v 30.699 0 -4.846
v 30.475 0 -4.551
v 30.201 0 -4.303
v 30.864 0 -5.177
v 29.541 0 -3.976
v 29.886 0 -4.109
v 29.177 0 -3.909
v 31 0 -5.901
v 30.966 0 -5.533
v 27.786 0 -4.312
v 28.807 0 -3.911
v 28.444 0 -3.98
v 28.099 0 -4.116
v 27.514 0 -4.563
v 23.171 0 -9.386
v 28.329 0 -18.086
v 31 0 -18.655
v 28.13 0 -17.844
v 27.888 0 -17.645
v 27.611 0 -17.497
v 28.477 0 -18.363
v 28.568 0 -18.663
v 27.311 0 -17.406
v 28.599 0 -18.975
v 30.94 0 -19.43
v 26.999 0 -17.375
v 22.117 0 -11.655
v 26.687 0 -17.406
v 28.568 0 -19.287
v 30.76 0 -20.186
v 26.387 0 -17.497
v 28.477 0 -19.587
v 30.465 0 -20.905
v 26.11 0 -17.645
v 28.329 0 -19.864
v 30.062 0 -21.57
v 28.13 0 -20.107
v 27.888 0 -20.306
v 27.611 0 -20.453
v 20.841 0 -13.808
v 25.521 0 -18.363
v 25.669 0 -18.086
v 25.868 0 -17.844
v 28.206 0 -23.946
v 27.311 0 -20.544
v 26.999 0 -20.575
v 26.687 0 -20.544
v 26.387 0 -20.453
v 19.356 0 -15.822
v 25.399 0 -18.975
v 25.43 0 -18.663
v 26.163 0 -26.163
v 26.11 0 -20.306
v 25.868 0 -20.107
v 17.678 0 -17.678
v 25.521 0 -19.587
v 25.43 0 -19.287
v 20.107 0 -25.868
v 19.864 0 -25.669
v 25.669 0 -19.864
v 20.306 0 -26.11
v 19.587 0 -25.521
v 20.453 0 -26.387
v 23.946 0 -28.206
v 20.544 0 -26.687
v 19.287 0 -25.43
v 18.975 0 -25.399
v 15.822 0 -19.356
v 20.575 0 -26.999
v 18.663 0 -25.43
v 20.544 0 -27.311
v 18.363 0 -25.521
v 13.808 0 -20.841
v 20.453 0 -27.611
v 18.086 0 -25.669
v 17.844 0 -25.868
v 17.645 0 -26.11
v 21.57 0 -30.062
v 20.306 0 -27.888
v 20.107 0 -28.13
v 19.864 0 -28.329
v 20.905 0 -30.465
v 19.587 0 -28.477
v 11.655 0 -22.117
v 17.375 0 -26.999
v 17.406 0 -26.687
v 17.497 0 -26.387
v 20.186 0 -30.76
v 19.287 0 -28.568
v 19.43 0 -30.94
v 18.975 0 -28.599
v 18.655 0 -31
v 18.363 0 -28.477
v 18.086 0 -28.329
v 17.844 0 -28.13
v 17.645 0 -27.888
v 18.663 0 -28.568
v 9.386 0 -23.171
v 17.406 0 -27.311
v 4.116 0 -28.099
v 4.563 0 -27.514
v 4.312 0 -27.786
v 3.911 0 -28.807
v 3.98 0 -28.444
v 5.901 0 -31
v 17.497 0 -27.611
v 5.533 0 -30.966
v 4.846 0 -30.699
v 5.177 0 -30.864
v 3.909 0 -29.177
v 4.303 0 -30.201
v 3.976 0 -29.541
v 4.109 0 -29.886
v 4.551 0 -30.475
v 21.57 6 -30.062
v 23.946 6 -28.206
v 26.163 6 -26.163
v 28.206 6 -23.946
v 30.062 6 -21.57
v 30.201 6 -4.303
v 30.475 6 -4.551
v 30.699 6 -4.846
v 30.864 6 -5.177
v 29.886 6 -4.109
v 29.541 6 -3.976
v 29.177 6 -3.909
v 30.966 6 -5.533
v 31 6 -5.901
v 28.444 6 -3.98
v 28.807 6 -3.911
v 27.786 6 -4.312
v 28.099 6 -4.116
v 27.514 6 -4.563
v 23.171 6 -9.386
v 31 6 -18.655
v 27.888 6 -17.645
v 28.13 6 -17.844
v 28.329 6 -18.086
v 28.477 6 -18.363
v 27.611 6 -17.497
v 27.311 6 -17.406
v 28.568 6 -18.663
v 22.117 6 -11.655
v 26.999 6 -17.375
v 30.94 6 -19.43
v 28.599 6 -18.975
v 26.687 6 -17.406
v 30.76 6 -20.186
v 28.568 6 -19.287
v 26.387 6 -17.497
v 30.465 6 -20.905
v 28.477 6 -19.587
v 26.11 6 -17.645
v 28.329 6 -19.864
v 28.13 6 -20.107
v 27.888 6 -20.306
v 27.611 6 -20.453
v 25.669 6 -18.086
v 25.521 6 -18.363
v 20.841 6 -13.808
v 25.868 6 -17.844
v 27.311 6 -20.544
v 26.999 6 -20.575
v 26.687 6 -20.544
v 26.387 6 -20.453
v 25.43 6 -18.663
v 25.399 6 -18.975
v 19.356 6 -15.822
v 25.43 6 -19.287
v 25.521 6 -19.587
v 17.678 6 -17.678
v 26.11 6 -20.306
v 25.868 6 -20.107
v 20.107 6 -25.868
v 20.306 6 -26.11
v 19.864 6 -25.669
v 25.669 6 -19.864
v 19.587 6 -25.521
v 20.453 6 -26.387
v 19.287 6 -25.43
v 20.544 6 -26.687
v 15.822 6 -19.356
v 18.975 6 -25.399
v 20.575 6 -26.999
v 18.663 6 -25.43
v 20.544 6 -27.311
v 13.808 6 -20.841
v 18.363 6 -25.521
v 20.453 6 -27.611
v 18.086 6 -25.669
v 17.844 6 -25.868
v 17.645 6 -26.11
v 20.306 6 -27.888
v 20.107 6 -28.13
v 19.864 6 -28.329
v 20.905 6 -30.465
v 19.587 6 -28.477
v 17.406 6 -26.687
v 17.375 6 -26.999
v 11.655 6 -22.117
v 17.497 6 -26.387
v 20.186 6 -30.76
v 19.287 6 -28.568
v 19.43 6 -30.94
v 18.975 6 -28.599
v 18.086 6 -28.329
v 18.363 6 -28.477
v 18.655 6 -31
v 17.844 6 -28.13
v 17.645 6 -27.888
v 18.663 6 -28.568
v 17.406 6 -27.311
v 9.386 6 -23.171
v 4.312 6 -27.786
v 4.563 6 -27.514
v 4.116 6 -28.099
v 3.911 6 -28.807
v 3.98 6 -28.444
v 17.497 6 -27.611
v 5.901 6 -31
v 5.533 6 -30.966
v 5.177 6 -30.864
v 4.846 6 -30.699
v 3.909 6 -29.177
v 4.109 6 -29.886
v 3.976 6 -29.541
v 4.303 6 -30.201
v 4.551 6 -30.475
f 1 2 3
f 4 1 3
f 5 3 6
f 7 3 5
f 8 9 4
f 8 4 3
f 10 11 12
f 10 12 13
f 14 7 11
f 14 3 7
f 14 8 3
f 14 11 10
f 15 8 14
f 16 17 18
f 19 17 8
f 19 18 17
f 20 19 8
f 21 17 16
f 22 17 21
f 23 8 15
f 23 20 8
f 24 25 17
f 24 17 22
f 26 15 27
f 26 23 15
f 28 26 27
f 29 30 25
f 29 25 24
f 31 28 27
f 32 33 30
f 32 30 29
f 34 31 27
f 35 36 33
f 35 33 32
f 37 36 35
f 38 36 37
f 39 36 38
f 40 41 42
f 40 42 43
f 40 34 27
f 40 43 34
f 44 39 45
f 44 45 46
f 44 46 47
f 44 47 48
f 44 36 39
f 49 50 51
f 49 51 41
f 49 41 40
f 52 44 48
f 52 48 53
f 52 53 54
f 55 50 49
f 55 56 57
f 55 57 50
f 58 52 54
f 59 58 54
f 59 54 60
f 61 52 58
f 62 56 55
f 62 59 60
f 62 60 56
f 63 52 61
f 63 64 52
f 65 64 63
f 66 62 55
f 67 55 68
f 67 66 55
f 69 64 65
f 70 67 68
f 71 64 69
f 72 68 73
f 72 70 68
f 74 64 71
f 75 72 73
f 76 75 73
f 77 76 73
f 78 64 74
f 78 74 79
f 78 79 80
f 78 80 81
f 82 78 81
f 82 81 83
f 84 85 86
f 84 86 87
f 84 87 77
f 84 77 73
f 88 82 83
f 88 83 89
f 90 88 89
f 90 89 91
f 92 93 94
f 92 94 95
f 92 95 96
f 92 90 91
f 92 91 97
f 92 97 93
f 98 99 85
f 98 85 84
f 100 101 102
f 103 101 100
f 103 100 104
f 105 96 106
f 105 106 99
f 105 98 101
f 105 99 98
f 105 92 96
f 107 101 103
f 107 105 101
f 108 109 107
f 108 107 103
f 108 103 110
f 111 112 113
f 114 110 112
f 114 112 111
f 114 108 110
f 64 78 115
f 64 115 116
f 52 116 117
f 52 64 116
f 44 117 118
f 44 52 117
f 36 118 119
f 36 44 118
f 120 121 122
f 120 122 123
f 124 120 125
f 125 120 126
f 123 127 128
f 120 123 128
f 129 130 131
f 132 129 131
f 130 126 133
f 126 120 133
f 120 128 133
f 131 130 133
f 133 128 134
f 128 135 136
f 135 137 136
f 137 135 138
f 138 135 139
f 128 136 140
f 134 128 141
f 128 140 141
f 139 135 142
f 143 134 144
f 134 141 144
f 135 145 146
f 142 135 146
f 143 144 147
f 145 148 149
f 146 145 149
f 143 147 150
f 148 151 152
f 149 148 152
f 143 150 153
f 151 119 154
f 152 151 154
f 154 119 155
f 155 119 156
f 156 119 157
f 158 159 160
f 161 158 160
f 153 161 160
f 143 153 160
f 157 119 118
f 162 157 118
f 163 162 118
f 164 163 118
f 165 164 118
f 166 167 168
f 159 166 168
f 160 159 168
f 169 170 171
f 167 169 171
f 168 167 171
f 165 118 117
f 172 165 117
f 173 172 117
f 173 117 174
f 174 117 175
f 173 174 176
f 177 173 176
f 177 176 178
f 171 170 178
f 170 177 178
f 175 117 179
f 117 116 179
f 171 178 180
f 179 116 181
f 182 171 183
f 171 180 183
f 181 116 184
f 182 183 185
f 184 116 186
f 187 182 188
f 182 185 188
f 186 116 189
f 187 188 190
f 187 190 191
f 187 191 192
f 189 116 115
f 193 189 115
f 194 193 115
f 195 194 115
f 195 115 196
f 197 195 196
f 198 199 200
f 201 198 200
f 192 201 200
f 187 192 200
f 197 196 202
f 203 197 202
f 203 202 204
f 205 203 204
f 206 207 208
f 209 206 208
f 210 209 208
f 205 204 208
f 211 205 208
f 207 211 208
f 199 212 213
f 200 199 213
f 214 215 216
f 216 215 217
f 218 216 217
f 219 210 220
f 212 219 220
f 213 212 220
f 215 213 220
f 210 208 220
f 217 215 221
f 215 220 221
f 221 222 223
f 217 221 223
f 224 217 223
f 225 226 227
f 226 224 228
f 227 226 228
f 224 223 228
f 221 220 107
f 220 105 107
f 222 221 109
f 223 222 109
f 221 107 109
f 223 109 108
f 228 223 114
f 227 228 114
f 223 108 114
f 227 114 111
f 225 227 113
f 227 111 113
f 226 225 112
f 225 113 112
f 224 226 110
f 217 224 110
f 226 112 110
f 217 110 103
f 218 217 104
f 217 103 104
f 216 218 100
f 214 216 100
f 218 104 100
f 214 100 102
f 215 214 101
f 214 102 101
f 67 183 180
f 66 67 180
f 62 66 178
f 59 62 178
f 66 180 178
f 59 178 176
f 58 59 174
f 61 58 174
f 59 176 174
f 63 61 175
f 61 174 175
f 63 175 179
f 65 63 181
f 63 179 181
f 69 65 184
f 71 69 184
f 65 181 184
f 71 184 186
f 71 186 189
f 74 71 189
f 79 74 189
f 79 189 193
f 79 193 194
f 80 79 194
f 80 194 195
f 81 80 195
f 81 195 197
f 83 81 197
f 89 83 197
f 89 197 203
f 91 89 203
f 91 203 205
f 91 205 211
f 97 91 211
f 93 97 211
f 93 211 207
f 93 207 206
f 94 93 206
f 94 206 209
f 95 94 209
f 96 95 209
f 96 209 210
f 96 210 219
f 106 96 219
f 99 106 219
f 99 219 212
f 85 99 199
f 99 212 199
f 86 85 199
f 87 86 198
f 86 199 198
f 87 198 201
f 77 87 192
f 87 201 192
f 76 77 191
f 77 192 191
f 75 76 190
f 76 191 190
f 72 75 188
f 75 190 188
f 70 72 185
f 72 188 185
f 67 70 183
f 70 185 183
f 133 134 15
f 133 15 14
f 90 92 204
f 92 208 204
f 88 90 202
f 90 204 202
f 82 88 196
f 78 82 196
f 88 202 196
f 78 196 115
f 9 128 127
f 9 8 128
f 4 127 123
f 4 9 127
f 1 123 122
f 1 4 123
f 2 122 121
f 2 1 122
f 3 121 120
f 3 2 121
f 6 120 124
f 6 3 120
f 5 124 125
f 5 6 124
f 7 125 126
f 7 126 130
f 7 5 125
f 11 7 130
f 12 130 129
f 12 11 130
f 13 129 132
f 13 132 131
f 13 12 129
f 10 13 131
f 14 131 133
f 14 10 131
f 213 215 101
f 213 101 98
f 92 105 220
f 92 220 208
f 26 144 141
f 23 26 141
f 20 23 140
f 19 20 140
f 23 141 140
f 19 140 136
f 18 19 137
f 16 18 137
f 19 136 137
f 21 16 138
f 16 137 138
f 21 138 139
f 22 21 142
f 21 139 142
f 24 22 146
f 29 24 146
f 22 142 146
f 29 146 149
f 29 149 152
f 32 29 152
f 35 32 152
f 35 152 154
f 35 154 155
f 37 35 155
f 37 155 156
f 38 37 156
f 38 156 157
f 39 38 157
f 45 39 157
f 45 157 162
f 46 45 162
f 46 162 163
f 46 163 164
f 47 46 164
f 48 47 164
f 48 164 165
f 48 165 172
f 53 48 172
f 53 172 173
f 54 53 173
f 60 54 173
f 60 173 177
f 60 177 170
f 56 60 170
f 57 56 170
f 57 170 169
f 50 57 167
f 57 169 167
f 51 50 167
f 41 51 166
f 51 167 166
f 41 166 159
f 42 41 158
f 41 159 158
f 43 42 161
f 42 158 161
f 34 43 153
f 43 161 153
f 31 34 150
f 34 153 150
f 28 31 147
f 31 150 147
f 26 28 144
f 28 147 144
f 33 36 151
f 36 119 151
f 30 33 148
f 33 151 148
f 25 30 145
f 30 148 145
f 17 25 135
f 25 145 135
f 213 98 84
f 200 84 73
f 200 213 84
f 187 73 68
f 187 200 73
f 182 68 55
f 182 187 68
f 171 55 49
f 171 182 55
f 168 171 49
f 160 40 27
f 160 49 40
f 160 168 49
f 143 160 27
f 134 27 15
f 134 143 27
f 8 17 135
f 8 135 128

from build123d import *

# Parameters (mm, degrees)
EXTRUDE_1_DEPTH     = 6
SKETCH_2_R          = 1.6
CUT_EXTRUDE_1_DEPTH = 10
SKETCH_3_OUTSIDE_W  = 89.27
SKETCH_3_OUTSIDE_H  = 89.27
CUT_EXTRUDE_2_DEPTH = 10
FILLET_1_R          = 5
FILLET_2_R          = 2


with BuildPart() as part:
    # 草图1 → 凸台-拉伸1 (new body)
    with BuildSketch(Plane(origin=(0, 0, 0), x_dir=(1, 0, 0), z_dir=(0, 1, 0))):
        with BuildLine():
            Line((-20.199009877, 31), (20.199009877, 31))
            ThreePointArc((20.199009877, 31), (26.162950904, 26.162950904), (31, 20.199009877))
            Line((31, 20.199009877), (31, -20.199009877))
            ThreePointArc((31, -20.199009877), (-26.162950904, -26.162950904), (-20.199009877, 31))
        make_face()
    extrude(amount=EXTRUDE_1_DEPTH)

    # 草图2 → 切除-拉伸1 (cut)
    with BuildSketch(Plane(origin=(0, 6, 0), x_dir=(1, 0, 0), z_dir=(0, 1, 0))):
        with Locations(Location((26.998940675, 18.975173317, 0), (0, 0, 270))):
            Circle(SKETCH_2_R)
        with Locations(Location((18.975173317, 26.998940675, 0), (0, 0, 270))):
            Circle(SKETCH_2_R)
    extrude(amount=-CUT_EXTRUDE_1_DEPTH, mode=Mode.SUBTRACT)

    # 草图3 outside → 切除-拉伸2 (cut)
    with BuildSketch(Plane(origin=(0, 6, 0), x_dir=(1, 0, 0), z_dir=(0, 1, 0))):
        with Locations((-3, -3)):
            Rectangle(SKETCH_3_OUTSIDE_W, SKETCH_3_OUTSIDE_H)
        with BuildLine():
            Line((0.691210962, 31), (9.386018717, 23.171159933))
            ThreePointArc((9.386018717, 23.171159933), (17.67766953, 17.67766953), (23.171159933, 9.386018717))
            Line((23.171159933, 9.386018717), (31, 0.691210962))
            Line((31, 0.691210962), (31, 20.199009877))
            ThreePointArc((31, 20.199009877), (26.162950904, 26.162950904), (20.199009877, 31))
            Line((20.199009877, 31), (0.691210962, 31))
        make_face(mode=Mode.SUBTRACT)
    extrude(amount=-CUT_EXTRUDE_2_DEPTH, mode=Mode.SUBTRACT)

    # 圆角1
    fillet_1_edges = [part.edges().sort_by_distance(p)[0] for p in [
        (20.199009877, 3, -31),
        (31, 3, -20.199009877),
    ]]
    fillet(fillet_1_edges, radius=FILLET_1_R)

    # 圆角2
    fillet_2_edges = [part.edges().sort_by_distance(p)[0] for p in [
        (31, 3, -0.691210962),
        (0.691210962, 3, -31),
    ]]
    fillet(fillet_2_edges, radius=FILLET_2_R)


solid = part.part
